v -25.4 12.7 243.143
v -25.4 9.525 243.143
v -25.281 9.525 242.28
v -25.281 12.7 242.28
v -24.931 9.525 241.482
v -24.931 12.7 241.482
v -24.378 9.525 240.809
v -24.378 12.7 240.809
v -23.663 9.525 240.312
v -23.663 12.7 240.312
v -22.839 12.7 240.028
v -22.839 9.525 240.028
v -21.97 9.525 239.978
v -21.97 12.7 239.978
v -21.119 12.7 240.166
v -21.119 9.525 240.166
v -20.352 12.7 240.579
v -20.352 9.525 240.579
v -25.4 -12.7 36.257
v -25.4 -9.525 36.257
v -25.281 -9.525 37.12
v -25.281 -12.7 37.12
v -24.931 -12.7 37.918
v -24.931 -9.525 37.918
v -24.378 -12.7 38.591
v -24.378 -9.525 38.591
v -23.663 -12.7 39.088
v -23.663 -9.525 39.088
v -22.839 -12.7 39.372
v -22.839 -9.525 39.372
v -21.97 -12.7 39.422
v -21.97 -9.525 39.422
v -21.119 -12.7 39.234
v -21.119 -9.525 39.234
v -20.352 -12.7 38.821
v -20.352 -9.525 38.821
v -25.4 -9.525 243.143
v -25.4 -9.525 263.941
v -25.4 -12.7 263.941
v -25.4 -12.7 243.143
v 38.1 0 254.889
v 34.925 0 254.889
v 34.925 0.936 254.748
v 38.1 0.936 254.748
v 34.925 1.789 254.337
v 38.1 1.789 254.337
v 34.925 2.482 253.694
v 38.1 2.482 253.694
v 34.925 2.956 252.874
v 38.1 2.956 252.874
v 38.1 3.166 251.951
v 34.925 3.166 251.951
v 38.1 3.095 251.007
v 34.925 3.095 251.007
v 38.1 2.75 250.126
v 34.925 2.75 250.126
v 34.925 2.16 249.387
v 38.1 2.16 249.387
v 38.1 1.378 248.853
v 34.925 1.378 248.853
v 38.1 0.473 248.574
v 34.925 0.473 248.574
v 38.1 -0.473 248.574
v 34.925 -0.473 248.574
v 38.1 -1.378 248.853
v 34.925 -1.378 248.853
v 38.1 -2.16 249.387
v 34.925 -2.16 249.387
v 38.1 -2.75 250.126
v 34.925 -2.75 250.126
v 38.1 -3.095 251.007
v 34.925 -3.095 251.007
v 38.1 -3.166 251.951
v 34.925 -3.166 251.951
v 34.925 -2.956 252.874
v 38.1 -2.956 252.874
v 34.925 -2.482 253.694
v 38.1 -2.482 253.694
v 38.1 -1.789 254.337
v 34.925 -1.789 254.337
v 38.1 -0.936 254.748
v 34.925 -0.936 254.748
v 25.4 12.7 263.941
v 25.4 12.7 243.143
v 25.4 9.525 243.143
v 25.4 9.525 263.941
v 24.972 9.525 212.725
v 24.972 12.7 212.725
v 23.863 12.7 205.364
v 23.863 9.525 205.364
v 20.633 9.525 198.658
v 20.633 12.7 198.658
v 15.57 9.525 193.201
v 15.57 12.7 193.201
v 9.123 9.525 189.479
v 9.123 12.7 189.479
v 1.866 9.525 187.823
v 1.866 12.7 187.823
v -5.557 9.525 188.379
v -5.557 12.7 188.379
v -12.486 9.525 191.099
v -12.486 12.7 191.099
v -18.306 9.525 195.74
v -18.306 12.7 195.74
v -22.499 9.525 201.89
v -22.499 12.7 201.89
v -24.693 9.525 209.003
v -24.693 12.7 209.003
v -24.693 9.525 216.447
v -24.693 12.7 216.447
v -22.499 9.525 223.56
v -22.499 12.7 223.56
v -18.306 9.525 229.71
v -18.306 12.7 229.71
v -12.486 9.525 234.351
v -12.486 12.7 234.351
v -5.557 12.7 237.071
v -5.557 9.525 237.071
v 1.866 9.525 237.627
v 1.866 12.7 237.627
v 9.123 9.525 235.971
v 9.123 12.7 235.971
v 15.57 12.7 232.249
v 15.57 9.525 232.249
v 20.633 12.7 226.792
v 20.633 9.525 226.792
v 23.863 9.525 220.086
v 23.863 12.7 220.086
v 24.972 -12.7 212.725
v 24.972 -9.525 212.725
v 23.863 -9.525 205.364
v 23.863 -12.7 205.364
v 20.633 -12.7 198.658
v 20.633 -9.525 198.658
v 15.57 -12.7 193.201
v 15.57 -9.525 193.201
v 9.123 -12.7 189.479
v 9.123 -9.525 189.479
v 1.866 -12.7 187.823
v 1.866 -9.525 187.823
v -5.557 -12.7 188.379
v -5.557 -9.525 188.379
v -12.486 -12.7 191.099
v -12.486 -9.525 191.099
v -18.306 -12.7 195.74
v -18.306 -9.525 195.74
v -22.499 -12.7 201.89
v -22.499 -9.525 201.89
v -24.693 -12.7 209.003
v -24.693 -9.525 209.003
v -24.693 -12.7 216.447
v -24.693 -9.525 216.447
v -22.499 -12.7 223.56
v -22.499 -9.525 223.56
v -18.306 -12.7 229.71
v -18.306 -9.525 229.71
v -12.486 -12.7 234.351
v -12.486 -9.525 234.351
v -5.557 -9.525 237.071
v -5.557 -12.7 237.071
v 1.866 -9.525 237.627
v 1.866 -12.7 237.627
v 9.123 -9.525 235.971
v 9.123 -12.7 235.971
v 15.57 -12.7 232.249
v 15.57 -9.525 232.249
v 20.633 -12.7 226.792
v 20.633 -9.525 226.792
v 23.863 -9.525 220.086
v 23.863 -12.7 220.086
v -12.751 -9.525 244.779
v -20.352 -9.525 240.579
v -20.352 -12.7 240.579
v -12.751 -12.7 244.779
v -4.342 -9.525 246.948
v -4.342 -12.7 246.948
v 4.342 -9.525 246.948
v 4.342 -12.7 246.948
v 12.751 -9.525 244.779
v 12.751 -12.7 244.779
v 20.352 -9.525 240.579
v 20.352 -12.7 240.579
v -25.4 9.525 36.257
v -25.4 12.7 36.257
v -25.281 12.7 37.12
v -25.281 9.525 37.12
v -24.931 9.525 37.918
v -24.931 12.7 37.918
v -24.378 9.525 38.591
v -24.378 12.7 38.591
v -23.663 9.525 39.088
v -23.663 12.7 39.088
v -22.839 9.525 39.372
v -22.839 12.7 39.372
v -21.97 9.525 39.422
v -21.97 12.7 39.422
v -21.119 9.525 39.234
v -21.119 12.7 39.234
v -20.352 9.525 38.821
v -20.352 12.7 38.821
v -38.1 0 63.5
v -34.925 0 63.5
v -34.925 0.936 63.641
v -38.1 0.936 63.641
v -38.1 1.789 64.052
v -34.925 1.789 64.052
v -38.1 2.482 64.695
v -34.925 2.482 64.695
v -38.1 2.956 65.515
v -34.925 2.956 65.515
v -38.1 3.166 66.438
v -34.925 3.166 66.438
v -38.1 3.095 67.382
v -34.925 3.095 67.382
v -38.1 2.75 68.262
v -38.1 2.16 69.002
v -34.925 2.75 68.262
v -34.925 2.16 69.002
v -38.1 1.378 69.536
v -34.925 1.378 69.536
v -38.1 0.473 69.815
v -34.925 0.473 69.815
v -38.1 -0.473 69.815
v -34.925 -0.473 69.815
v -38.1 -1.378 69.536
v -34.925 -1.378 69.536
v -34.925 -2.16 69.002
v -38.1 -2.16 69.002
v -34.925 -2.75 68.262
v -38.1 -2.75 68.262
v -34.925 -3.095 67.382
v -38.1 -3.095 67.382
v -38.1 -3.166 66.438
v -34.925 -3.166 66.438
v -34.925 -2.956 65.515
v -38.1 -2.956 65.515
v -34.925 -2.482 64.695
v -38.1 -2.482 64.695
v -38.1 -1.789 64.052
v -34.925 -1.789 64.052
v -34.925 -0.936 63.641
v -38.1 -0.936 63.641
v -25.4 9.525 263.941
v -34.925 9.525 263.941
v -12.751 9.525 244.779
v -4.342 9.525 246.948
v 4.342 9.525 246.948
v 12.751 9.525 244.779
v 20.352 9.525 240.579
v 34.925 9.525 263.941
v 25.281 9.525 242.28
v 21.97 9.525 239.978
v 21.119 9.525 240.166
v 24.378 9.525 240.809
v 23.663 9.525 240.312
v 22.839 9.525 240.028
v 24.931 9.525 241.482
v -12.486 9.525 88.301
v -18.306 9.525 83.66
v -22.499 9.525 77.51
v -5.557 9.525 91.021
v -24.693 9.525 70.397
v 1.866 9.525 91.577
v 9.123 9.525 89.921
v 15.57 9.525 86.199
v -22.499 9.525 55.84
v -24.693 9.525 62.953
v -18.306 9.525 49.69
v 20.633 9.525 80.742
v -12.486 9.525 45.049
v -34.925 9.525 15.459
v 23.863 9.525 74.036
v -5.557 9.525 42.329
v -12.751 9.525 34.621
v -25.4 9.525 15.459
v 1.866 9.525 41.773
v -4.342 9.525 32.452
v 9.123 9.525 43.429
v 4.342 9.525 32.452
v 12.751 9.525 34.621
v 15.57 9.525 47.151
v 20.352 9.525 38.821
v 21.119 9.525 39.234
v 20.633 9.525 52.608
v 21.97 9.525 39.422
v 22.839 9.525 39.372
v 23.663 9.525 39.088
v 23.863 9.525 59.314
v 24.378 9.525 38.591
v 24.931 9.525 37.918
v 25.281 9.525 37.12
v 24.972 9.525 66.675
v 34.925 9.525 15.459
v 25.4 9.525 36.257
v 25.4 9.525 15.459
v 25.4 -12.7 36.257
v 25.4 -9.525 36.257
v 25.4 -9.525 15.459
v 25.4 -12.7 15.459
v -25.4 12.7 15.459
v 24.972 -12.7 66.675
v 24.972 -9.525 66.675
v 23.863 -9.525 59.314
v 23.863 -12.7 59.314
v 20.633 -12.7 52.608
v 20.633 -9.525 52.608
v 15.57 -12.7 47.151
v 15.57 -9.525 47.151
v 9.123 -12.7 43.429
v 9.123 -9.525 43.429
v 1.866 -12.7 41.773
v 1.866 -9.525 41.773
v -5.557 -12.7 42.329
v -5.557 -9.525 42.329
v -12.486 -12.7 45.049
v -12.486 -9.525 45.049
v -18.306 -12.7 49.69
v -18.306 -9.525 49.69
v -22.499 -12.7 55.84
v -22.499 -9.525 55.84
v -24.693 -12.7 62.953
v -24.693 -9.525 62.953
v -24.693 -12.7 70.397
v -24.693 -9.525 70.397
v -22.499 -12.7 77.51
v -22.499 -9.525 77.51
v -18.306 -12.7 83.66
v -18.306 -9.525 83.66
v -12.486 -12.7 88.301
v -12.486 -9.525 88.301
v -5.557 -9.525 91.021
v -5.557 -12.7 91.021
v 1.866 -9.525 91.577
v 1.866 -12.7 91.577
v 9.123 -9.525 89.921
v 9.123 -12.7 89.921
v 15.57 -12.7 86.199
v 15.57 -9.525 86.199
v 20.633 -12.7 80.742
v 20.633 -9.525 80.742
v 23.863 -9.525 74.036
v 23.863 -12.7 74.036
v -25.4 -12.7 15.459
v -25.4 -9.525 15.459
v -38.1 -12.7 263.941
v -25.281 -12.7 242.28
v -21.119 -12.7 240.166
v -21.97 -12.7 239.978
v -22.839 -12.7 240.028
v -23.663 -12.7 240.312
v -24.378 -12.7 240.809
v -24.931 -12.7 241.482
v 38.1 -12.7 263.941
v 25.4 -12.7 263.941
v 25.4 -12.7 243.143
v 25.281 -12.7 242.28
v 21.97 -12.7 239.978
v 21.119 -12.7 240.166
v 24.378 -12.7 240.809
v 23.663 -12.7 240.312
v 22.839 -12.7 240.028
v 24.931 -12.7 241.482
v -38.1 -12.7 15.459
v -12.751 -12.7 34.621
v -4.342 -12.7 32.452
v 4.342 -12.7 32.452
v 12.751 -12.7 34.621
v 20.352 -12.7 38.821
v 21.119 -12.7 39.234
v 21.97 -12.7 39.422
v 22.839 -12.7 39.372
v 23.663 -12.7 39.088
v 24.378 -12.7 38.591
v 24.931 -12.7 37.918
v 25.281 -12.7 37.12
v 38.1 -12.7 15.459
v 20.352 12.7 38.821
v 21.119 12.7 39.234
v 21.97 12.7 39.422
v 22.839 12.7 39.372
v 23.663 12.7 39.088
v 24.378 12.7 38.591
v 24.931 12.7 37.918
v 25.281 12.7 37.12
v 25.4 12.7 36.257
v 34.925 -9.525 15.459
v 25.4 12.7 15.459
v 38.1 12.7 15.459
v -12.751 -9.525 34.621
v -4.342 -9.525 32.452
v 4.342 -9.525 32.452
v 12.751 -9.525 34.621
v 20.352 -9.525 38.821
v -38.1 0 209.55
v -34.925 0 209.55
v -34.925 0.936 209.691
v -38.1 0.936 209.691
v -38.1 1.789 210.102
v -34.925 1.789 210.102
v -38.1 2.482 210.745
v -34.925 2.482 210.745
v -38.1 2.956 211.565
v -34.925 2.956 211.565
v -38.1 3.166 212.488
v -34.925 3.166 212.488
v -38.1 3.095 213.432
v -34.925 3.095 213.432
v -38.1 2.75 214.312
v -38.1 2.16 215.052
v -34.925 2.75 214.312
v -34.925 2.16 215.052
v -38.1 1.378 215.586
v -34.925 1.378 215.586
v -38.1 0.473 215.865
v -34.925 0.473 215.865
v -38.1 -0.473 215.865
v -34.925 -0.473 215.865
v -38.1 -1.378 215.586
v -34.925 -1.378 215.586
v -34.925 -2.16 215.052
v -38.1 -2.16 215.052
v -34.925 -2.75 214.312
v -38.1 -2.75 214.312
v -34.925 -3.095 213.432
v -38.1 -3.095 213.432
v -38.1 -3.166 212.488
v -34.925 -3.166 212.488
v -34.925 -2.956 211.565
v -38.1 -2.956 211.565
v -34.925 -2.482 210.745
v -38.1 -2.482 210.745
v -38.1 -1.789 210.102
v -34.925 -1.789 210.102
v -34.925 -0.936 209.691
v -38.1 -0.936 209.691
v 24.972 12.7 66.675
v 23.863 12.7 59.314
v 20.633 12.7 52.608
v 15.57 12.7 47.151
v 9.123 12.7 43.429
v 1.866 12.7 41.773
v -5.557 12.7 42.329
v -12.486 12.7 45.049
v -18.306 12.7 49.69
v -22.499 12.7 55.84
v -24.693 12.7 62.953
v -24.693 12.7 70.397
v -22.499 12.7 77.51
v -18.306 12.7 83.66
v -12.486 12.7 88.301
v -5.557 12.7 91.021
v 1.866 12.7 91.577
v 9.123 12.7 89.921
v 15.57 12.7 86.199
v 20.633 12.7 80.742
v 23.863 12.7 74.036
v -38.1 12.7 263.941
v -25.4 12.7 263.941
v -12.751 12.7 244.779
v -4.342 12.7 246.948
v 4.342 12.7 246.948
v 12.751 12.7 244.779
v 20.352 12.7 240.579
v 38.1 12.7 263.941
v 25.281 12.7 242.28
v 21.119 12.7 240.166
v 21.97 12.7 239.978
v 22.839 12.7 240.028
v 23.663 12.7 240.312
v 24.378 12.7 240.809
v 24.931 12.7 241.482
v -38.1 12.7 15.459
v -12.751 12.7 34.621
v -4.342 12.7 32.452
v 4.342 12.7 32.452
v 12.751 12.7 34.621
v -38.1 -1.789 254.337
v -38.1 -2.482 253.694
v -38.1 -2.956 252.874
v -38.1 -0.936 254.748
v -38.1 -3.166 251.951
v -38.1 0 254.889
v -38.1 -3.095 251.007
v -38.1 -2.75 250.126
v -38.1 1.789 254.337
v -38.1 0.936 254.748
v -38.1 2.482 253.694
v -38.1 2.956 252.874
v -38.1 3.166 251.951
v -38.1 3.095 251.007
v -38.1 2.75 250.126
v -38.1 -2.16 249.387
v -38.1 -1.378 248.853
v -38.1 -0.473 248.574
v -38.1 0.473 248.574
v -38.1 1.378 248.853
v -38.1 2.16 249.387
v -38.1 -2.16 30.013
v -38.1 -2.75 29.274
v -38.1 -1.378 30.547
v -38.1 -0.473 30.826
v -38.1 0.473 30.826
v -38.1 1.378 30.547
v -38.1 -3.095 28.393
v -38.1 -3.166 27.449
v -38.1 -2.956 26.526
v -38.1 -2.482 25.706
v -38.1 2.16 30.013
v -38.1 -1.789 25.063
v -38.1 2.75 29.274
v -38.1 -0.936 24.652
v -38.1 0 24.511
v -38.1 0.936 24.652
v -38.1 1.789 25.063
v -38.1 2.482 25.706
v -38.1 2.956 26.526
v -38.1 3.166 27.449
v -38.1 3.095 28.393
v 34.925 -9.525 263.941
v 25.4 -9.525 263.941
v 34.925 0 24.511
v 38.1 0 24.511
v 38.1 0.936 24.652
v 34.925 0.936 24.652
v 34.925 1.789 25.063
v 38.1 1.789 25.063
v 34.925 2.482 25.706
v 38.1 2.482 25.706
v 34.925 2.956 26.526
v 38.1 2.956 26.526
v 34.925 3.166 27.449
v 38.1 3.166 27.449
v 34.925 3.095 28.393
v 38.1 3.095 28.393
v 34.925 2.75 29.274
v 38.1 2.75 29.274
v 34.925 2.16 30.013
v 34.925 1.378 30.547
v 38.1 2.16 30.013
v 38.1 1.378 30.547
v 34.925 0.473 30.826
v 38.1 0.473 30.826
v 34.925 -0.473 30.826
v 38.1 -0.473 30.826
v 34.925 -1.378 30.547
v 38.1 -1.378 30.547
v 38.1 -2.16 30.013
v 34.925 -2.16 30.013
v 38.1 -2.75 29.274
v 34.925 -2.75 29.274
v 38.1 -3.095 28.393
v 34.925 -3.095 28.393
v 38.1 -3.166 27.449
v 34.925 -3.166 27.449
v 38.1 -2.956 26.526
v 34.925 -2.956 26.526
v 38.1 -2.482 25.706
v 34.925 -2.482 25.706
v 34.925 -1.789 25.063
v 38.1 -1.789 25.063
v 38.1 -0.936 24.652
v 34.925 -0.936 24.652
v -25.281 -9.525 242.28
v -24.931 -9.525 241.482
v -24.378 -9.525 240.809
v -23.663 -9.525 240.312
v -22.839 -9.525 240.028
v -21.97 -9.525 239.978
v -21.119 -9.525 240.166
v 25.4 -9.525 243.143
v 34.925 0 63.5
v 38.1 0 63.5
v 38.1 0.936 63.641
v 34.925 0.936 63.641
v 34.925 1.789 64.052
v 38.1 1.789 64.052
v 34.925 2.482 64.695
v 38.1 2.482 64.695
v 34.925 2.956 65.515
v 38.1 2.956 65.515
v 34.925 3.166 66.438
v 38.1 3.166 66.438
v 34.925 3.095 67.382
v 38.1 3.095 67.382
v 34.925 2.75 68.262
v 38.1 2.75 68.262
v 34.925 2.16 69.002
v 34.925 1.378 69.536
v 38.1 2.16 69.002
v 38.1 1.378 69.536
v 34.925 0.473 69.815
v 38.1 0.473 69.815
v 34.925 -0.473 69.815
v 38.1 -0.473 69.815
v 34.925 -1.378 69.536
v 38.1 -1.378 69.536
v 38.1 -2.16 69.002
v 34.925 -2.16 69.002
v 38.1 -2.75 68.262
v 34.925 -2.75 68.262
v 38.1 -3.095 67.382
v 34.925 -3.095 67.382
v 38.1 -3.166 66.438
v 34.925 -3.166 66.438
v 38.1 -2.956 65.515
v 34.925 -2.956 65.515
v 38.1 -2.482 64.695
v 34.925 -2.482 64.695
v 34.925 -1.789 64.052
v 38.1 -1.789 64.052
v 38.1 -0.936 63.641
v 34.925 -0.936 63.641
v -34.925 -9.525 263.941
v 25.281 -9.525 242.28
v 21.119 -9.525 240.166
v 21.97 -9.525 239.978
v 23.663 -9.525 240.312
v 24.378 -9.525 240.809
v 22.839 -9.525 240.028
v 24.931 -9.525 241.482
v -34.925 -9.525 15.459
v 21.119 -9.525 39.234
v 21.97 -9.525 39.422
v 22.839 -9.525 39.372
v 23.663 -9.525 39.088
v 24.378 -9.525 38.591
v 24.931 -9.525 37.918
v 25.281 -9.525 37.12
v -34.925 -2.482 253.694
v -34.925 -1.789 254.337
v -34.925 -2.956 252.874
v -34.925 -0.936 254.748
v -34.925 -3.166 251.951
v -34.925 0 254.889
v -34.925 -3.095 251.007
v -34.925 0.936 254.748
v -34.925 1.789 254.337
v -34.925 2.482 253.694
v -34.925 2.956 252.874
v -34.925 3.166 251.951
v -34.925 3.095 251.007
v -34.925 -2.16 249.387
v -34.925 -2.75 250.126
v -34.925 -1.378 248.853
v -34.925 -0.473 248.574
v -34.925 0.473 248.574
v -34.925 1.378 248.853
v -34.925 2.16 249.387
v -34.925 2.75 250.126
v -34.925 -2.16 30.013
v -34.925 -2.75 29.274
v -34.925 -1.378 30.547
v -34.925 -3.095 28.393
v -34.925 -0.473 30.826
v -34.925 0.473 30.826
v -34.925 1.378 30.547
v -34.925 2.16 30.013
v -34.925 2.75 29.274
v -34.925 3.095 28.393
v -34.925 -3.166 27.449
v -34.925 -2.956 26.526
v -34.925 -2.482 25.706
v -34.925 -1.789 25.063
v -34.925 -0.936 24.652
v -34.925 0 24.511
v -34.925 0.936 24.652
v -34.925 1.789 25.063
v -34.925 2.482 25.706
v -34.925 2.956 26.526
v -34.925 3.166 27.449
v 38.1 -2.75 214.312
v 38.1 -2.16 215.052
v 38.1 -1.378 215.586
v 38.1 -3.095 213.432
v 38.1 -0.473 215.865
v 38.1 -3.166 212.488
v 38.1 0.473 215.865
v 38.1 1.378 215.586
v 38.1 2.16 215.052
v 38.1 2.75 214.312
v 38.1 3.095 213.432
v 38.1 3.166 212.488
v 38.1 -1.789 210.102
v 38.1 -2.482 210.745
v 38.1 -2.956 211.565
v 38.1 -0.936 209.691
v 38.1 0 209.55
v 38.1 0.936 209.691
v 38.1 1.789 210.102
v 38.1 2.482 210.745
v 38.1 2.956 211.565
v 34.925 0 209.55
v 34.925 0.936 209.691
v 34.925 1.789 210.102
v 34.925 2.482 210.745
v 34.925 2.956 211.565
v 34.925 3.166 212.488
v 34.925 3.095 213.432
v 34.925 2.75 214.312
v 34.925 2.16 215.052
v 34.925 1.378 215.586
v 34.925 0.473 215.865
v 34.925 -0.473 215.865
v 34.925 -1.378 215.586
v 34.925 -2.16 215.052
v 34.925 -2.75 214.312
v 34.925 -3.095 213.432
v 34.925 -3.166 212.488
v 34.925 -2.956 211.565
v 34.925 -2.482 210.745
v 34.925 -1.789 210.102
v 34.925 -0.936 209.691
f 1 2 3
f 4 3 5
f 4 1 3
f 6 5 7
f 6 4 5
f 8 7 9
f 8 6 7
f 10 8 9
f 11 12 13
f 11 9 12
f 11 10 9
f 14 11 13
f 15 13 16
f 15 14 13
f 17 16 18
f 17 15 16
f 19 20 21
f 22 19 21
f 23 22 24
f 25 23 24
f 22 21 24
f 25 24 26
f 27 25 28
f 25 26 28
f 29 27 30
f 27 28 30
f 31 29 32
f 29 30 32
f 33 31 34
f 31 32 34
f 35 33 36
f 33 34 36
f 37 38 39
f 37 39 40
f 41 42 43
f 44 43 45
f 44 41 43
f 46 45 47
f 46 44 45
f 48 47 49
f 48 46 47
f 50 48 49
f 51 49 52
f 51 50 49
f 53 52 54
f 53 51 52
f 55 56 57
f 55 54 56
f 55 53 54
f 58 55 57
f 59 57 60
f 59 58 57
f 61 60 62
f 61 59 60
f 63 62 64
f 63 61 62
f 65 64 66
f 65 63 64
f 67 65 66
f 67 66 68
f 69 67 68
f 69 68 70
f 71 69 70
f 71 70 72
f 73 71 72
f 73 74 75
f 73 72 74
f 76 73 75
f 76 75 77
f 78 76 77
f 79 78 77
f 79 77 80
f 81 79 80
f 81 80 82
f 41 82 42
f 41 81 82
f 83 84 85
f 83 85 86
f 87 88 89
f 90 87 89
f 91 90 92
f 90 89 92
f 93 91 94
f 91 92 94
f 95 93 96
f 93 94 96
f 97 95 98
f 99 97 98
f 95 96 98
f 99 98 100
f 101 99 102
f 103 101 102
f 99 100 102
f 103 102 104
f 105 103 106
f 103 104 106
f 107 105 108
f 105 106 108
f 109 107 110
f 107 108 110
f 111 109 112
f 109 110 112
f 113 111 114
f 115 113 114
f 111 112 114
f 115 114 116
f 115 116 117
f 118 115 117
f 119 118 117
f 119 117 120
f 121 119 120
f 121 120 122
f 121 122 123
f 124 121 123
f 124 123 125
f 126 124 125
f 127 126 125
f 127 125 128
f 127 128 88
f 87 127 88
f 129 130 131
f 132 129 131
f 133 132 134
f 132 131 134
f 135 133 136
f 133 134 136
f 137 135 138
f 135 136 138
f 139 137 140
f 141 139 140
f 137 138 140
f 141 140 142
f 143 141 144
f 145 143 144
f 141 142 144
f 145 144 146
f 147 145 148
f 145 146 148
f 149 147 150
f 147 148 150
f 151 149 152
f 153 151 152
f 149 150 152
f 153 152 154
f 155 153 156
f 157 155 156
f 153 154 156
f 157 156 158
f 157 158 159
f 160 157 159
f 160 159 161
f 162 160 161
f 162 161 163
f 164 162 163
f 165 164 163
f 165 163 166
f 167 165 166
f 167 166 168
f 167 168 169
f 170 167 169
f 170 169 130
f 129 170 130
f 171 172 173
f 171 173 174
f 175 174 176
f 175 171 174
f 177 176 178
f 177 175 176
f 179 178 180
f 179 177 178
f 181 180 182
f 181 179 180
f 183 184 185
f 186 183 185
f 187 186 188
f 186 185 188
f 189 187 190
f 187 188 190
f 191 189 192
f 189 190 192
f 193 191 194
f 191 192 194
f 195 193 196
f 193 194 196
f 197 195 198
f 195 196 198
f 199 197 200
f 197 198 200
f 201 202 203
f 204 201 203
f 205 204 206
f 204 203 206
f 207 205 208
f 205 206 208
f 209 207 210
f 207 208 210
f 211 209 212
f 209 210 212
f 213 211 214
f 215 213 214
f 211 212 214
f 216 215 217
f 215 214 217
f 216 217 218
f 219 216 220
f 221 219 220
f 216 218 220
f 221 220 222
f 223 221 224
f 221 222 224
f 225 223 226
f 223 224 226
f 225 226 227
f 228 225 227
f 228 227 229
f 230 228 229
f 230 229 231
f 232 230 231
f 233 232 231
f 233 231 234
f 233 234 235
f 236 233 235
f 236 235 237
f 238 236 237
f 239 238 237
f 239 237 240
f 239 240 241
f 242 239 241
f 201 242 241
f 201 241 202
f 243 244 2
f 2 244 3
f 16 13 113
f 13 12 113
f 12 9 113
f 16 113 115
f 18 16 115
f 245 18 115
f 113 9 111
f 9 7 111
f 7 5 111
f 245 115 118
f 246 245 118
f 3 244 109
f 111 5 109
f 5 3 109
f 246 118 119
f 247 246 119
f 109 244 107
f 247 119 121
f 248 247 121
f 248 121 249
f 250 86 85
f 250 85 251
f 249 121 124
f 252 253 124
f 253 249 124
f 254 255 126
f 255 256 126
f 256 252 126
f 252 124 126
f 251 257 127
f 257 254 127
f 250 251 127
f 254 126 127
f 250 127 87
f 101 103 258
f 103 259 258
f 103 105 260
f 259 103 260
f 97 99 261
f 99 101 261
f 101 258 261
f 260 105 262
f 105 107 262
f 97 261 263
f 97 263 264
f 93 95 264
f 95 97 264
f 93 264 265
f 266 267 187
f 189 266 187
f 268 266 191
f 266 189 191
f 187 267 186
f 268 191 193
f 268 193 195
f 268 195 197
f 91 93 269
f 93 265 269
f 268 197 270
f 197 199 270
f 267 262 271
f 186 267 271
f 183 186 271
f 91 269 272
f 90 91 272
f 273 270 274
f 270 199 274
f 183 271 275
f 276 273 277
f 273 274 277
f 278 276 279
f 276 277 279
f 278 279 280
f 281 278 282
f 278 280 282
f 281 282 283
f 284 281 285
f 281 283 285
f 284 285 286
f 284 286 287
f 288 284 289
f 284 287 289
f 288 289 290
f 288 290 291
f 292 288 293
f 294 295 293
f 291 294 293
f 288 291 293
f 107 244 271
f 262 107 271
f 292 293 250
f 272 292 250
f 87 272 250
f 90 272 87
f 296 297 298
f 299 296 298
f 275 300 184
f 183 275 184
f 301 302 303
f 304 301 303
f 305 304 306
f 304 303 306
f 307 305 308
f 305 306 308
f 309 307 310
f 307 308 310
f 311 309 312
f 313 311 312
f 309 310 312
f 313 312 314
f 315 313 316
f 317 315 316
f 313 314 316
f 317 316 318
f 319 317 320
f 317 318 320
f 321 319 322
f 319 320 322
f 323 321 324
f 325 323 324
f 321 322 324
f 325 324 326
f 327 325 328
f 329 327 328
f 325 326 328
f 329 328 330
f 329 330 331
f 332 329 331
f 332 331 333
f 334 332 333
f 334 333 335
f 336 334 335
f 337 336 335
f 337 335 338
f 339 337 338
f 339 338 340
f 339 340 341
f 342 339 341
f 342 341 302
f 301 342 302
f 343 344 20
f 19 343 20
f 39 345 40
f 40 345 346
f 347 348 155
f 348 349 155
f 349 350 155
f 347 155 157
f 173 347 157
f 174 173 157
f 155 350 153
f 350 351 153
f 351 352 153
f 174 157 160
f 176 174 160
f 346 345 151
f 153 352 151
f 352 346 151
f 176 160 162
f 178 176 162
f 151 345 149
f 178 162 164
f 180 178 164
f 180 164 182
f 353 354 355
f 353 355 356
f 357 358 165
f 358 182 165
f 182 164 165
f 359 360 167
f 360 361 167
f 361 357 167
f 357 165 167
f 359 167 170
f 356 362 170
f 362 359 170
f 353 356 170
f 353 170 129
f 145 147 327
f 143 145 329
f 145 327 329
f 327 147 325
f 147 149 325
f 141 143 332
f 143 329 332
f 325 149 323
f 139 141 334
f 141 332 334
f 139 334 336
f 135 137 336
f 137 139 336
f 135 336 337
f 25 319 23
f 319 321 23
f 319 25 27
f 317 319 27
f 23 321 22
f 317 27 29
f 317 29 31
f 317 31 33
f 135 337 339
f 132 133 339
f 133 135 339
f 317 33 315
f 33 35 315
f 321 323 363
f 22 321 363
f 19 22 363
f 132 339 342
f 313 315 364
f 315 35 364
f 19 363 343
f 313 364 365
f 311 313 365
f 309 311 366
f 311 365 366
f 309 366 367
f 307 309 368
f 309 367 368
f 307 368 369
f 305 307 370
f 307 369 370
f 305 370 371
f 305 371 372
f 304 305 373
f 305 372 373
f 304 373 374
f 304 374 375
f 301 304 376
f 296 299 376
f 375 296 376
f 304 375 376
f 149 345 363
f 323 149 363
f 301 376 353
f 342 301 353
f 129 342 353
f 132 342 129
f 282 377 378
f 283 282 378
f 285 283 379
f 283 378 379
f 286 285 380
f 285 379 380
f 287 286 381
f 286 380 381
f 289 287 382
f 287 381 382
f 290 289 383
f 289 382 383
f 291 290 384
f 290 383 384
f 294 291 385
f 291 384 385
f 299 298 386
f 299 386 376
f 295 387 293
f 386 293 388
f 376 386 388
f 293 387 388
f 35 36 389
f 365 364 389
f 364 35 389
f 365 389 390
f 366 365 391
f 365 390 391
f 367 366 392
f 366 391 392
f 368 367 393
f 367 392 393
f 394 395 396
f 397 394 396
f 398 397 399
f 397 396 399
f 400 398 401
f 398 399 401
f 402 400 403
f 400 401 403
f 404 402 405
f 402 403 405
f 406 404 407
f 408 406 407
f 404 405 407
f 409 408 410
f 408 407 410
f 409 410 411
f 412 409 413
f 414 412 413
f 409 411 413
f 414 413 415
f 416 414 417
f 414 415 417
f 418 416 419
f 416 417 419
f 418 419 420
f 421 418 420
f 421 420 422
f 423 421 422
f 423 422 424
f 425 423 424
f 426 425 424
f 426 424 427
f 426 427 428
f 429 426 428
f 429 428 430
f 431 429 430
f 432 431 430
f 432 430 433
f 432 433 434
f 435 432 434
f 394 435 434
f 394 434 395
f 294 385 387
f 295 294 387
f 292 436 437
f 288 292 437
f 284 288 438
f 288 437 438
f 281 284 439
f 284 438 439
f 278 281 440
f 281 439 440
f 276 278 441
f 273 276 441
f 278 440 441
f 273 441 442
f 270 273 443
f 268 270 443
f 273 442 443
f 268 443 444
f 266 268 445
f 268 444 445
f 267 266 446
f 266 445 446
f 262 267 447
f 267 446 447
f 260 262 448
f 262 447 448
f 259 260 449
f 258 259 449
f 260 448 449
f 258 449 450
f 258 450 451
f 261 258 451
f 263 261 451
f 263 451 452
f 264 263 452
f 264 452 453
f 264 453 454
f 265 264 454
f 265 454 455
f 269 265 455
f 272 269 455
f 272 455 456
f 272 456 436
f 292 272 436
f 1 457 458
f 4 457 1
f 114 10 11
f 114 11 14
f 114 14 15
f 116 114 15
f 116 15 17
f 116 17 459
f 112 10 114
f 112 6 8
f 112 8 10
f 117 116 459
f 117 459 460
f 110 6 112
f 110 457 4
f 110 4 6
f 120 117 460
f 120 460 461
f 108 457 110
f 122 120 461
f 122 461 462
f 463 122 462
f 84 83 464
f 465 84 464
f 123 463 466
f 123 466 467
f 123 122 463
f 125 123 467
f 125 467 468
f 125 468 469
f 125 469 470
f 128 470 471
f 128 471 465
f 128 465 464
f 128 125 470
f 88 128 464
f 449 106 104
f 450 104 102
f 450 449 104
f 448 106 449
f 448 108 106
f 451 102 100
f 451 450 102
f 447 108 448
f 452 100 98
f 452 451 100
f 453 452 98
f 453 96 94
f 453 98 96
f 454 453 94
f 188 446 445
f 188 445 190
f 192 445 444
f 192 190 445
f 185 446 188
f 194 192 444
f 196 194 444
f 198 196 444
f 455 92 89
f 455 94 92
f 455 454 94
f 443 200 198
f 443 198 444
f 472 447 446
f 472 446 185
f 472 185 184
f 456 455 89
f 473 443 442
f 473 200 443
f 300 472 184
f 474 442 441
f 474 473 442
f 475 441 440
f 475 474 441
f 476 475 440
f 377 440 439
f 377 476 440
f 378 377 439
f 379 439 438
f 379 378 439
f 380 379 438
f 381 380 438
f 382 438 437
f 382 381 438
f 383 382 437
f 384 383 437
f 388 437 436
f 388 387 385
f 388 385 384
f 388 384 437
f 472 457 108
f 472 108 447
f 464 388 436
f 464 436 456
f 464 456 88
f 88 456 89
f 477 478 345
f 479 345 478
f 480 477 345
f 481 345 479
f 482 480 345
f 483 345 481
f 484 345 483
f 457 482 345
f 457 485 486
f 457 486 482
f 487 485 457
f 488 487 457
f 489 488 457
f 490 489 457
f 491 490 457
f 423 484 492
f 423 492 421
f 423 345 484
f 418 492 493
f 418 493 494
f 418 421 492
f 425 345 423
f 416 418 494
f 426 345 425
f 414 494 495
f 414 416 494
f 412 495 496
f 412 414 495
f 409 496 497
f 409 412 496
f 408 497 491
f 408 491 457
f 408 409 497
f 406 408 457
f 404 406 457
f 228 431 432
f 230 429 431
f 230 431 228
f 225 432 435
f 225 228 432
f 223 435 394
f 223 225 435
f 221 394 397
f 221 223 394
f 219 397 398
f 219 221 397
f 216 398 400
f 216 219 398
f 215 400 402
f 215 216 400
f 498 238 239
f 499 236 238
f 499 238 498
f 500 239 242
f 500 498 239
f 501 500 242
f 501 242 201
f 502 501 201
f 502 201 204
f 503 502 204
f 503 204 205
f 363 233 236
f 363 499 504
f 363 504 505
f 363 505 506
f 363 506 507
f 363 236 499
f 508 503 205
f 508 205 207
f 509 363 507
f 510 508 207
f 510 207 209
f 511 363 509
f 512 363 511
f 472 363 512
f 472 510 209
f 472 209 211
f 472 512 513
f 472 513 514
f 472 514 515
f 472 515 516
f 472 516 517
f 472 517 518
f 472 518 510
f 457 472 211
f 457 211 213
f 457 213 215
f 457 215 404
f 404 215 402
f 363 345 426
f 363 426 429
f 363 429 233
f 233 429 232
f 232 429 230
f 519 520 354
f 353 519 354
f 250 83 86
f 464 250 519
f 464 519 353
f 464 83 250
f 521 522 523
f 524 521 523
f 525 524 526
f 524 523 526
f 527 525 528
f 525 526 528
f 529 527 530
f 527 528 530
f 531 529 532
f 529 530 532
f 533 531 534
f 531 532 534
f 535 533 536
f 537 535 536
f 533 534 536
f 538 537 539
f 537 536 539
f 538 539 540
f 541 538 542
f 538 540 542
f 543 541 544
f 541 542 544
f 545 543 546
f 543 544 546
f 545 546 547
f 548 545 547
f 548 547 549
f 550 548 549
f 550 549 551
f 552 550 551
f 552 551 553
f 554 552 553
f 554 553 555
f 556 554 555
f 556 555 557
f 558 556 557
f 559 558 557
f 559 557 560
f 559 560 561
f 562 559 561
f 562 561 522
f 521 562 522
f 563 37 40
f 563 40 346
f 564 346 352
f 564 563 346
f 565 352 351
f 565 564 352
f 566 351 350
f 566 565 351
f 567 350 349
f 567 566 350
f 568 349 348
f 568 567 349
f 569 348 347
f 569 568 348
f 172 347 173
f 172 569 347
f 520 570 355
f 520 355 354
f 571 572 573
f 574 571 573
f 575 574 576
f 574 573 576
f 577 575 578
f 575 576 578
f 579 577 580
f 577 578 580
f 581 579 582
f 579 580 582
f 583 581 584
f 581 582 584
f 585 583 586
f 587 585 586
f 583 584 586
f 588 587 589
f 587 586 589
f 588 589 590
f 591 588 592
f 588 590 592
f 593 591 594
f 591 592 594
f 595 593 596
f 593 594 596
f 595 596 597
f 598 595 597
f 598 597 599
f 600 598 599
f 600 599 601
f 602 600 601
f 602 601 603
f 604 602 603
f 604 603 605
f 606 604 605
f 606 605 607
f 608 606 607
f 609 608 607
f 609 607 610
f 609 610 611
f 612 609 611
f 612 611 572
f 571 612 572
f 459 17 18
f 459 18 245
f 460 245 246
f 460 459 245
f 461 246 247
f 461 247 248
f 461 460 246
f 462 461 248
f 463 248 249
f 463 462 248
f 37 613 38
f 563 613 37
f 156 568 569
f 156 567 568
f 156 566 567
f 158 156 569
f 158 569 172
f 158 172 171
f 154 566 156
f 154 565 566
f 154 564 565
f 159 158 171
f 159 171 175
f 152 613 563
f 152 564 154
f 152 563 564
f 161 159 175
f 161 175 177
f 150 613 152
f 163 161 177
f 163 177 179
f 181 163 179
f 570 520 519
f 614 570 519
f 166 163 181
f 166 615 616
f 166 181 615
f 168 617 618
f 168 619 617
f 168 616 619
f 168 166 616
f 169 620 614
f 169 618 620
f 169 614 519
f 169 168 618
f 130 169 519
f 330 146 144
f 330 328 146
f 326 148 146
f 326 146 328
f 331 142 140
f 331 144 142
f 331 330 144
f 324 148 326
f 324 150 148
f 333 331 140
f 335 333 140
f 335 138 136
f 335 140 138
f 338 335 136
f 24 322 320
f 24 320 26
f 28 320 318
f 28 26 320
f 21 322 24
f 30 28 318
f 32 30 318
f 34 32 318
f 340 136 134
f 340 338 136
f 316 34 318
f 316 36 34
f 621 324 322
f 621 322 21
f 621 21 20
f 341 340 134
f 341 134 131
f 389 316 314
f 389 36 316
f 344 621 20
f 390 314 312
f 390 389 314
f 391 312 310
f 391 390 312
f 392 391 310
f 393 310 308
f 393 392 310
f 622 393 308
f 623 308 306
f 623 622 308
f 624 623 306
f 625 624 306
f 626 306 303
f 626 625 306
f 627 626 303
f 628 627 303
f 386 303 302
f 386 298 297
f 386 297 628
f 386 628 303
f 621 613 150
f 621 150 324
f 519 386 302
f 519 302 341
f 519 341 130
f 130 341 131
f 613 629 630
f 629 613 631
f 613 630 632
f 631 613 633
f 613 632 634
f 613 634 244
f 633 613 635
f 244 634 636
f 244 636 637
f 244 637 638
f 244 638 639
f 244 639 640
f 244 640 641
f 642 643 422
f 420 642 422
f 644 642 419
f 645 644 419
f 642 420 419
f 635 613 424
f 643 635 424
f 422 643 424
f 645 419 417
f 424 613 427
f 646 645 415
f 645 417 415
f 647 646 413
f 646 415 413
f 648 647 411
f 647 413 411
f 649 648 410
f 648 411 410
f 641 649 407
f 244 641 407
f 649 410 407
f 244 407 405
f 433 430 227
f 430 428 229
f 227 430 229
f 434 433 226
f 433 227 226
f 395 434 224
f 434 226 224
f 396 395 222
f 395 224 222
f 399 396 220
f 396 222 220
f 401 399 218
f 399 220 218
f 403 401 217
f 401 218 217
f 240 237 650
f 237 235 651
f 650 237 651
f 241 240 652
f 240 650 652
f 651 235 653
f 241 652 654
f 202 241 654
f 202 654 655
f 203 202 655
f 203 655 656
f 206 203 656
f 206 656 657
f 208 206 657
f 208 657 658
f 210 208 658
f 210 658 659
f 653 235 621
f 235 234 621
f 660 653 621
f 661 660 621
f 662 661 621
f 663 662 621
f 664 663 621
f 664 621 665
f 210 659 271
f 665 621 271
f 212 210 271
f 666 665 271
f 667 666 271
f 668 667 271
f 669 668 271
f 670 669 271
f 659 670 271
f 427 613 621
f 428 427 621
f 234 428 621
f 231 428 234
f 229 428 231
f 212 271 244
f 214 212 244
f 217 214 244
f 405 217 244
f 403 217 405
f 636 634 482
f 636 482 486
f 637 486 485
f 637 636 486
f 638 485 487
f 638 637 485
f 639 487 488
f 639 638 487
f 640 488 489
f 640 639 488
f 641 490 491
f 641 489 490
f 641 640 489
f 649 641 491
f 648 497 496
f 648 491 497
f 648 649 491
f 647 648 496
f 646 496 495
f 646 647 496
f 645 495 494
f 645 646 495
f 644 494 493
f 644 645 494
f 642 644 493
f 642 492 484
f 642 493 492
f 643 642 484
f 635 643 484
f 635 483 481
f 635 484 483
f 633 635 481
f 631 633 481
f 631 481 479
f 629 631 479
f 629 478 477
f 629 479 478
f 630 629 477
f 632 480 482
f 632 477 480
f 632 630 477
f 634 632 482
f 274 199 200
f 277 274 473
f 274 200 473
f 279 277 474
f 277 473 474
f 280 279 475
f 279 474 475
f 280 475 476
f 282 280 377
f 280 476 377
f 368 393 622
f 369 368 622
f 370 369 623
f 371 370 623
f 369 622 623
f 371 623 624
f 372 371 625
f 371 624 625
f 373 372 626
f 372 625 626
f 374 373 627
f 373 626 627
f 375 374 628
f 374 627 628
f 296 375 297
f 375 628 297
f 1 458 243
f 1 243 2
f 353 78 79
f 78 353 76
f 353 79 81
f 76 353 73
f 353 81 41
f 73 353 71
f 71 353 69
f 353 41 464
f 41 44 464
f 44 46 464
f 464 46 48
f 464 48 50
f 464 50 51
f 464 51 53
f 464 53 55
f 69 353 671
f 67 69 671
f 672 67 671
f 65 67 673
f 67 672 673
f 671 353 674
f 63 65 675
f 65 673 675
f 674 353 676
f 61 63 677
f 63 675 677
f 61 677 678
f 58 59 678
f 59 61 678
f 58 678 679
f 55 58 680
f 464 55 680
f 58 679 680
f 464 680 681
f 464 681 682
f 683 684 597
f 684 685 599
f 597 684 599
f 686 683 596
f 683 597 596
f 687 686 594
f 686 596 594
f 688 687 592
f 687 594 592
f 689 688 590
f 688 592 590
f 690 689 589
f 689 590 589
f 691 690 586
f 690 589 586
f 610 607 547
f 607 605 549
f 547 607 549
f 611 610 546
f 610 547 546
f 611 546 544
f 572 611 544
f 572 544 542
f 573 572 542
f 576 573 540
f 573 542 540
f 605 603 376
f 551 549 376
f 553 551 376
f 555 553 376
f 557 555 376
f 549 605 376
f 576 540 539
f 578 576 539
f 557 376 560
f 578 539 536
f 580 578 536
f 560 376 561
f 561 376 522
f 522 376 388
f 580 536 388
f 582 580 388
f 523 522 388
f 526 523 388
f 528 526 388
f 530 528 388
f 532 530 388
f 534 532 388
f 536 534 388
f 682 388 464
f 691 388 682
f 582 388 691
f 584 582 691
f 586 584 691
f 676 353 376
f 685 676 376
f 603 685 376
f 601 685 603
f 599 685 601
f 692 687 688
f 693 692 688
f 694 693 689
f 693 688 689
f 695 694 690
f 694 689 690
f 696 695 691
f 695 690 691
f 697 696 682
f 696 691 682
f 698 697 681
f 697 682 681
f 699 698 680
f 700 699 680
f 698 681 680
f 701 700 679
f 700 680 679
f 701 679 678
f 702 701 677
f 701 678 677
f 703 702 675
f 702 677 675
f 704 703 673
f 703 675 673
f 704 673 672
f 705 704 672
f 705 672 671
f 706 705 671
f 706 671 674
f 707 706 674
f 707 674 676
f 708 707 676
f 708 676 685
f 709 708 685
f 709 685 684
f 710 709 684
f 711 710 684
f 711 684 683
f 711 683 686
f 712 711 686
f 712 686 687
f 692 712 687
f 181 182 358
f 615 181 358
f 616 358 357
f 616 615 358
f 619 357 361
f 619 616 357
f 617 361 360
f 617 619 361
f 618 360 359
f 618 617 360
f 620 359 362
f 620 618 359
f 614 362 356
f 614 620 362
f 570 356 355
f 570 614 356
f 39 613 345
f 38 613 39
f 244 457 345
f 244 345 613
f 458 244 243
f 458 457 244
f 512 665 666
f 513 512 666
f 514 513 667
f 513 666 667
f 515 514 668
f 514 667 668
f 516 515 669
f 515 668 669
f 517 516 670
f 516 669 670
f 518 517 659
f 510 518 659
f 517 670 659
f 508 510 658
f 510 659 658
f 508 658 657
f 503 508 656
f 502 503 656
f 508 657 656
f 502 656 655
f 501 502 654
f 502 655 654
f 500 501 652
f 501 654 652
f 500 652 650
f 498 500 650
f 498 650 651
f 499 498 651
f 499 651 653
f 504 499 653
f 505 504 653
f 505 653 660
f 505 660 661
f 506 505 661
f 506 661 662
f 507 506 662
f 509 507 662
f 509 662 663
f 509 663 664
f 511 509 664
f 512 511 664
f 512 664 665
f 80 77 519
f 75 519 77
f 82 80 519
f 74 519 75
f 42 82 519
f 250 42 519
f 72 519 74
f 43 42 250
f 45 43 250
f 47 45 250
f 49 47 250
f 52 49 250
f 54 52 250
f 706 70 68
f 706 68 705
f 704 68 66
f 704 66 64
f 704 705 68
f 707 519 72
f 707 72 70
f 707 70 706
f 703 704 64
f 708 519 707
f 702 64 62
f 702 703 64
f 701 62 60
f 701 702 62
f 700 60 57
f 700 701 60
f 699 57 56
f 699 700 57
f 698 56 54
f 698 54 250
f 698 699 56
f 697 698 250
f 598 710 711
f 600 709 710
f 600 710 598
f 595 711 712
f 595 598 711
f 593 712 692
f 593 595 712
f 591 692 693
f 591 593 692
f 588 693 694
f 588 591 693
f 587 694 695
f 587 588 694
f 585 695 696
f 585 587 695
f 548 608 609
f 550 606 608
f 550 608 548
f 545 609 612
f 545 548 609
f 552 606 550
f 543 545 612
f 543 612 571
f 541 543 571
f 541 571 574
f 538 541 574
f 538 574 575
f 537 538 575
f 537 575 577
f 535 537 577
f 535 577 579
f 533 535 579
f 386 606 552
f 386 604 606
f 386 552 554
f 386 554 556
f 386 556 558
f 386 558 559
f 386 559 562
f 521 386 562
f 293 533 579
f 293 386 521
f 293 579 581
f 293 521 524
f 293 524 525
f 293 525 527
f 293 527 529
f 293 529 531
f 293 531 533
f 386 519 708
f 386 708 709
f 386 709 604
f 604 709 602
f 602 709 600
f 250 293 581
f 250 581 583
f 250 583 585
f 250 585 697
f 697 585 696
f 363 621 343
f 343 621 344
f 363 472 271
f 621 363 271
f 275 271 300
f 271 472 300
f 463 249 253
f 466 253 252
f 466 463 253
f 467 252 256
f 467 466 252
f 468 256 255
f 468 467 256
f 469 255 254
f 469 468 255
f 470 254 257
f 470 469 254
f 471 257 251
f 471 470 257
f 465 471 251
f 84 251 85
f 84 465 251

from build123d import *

# Parameters (mm, degrees)
SKETCH1_W           = 76.2
SKETCH1_H           = 25.4
SKETCH1_W_2         = 69.85
SKETCH1_H_2         = 19.05
EXTRUDE_THIN1_DEPTH = 279.4
CUT_EXTRUDE2_DEPTH  = 26.4
SKETCH4_R           = 24.97201
CUT_EXTRUDE3_DEPTH  = 26.4
CUT_EXTRUDE7_DEPTH  = 26.4
SKETCH7_R           = 3.175
CUT_EXTRUDE8_DEPTH  = 77.2
SKETCH8_R           = 3.175
CUT_EXTRUDE9_DEPTH  = 77.2


with BuildPart() as part:
    # Sketch1 → Extrude-Thin1 (new body)
    with BuildSketch(Plane.XY):
        Rectangle(SKETCH1_W, SKETCH1_H)
        Rectangle(SKETCH1_W_2, SKETCH1_H_2, mode=Mode.SUBTRACT)
    extrude(amount=EXTRUDE_THIN1_DEPTH)

    # Sketch3 → Cut-Extrude2 (cut, through all)
    with BuildSketch(Plane(origin=(0, 12.7, 0), x_dir=(1, 0, 0), z_dir=(0, 1, 0))):
        with BuildLine():
            ThreePointArc((-29.73451, -279.4), (-29.157760237, -285.228044516), (-27.449884971, -290.83))
            ThreePointArc((-27.449884971, -290.83), (0, -309.13451), (27.449884971, -290.83))
            ThreePointArc((27.449884971, -290.83), (29.157760237, -285.228044516), (29.73451, -279.4))
            Line((29.73451, -279.4), (-29.73451, -279.4))
        make_face()
        with BuildLine():
            ThreePointArc((29.73451, -279.4), (0, -249.66549), (-29.73451, -279.4))
            Line((-29.73451, -279.4), (29.73451, -279.4))
        make_face()
        with BuildLine():
            ThreePointArc((-29.73451, 0), (-29.157760237, -5.828044516), (-27.449884971, -11.43))
            ThreePointArc((-27.449884971, -11.43), (0, -29.73451), (27.449884971, -11.43))
            ThreePointArc((27.449884971, -11.43), (29.157760237, -5.828044516), (29.73451, 0))
            Line((29.73451, 0), (-29.73451, 0))
        make_face()
        with BuildLine():
            ThreePointArc((29.73451, 0), (0, 29.73451), (-29.73451, 0))
            Line((-29.73451, 0), (29.73451, 0))
        make_face()
    extrude(amount=-CUT_EXTRUDE2_DEPTH, mode=Mode.SUBTRACT)

    # Sketch4 → Cut-Extrude3 (cut, through all)
    with BuildSketch(Plane(origin=(0, 12.7, 0), x_dir=(1, 0, 0), z_dir=(0, 1, 0))):
        with Locations((0, -212.725)):
            Circle(SKETCH4_R)
        with Locations((0, -66.675)):
            Circle(SKETCH4_R)
    extrude(amount=-CUT_EXTRUDE3_DEPTH, mode=Mode.SUBTRACT)

    # Sketch6 → Cut-Extrude7 (cut, through all)
    with BuildSketch(Plane(origin=(0, 12.7, 0), x_dir=(1, 0, 0), z_dir=(0, 1, 0))):
        with BuildLine():
            Line((-38.1, 0), (-38.1, -15.459013065))
            Line((-38.1, -15.459013065), (-25.4, -15.459013065))
            ThreePointArc((-25.4, -15.459013065), (-28.630382803, -8.027594003), (-29.73451, 0))
            Line((-29.73451, 0), (-38.1, 0))
        make_face()
        with BuildLine():
            ThreePointArc((25.4, -15.459013065), (0, -29.73451), (-25.4, -15.459013065))
            Line((-25.4, -15.459013065), (-25.4, -36.257411134))
            ThreePointArc((-25.4, -36.257411134), (-23.662611537, -39.088294047), (-20.351875232, -38.821007943))
            ThreePointArc((-20.351875232, -38.821007943), (0, -32.17799), (20.351875232, -38.821007943))
            ThreePointArc((20.351875232, -38.821007943), (23.662611537, -39.088294047), (25.4, -36.257411134))
            Line((25.4, -36.257411134), (25.4, -15.459013065))
        make_face()
        with BuildLine():
            ThreePointArc((29.73451, 0), (28.630382803, -8.027594003), (25.4, -15.459013065))
            Line((25.4, -15.459013065), (38.1, -15.459013065))
            Line((38.1, -15.459013065), (38.1, 0))
            Line((38.1, 0), (29.73451, 0))
        make_face()
    cut_extrude7 = extrude(amount=-CUT_EXTRUDE7_DEPTH, mode=Mode.SUBTRACT)

    # Sketch7 → Cut-Extrude8 (cut, through all)
    with BuildSketch(Plane(origin=(38.1, 0, 0), x_dir=(0, 0, -1), z_dir=(1, 0, 0))):
        with Locations((-27.686, 0)):
            Circle(SKETCH7_R)
    cut_extrude8 = extrude(amount=-CUT_EXTRUDE8_DEPTH, mode=Mode.SUBTRACT)

    # Mirror3: Cut-Extrude7, Cut-Extrude8 across plane
    add(cut_extrude7.mirror(Plane.XY.offset(139.7)), mode=Mode.SUBTRACT)
    add(cut_extrude8.mirror(Plane.XY.offset(139.7)), mode=Mode.SUBTRACT)

    # Sketch8 → Cut-Extrude9 (cut, through all)
    with BuildSketch(Plane(origin=(38.1, 0, 0), x_dir=(0, 0, -1), z_dir=(1, 0, 0))):
        with Locations((-66.675, 0)):
            Circle(SKETCH8_R)
        with Locations((-212.725, 0)):
            Circle(SKETCH8_R)
    extrude(amount=-CUT_EXTRUDE9_DEPTH, mode=Mode.SUBTRACT)


solid = part.part
